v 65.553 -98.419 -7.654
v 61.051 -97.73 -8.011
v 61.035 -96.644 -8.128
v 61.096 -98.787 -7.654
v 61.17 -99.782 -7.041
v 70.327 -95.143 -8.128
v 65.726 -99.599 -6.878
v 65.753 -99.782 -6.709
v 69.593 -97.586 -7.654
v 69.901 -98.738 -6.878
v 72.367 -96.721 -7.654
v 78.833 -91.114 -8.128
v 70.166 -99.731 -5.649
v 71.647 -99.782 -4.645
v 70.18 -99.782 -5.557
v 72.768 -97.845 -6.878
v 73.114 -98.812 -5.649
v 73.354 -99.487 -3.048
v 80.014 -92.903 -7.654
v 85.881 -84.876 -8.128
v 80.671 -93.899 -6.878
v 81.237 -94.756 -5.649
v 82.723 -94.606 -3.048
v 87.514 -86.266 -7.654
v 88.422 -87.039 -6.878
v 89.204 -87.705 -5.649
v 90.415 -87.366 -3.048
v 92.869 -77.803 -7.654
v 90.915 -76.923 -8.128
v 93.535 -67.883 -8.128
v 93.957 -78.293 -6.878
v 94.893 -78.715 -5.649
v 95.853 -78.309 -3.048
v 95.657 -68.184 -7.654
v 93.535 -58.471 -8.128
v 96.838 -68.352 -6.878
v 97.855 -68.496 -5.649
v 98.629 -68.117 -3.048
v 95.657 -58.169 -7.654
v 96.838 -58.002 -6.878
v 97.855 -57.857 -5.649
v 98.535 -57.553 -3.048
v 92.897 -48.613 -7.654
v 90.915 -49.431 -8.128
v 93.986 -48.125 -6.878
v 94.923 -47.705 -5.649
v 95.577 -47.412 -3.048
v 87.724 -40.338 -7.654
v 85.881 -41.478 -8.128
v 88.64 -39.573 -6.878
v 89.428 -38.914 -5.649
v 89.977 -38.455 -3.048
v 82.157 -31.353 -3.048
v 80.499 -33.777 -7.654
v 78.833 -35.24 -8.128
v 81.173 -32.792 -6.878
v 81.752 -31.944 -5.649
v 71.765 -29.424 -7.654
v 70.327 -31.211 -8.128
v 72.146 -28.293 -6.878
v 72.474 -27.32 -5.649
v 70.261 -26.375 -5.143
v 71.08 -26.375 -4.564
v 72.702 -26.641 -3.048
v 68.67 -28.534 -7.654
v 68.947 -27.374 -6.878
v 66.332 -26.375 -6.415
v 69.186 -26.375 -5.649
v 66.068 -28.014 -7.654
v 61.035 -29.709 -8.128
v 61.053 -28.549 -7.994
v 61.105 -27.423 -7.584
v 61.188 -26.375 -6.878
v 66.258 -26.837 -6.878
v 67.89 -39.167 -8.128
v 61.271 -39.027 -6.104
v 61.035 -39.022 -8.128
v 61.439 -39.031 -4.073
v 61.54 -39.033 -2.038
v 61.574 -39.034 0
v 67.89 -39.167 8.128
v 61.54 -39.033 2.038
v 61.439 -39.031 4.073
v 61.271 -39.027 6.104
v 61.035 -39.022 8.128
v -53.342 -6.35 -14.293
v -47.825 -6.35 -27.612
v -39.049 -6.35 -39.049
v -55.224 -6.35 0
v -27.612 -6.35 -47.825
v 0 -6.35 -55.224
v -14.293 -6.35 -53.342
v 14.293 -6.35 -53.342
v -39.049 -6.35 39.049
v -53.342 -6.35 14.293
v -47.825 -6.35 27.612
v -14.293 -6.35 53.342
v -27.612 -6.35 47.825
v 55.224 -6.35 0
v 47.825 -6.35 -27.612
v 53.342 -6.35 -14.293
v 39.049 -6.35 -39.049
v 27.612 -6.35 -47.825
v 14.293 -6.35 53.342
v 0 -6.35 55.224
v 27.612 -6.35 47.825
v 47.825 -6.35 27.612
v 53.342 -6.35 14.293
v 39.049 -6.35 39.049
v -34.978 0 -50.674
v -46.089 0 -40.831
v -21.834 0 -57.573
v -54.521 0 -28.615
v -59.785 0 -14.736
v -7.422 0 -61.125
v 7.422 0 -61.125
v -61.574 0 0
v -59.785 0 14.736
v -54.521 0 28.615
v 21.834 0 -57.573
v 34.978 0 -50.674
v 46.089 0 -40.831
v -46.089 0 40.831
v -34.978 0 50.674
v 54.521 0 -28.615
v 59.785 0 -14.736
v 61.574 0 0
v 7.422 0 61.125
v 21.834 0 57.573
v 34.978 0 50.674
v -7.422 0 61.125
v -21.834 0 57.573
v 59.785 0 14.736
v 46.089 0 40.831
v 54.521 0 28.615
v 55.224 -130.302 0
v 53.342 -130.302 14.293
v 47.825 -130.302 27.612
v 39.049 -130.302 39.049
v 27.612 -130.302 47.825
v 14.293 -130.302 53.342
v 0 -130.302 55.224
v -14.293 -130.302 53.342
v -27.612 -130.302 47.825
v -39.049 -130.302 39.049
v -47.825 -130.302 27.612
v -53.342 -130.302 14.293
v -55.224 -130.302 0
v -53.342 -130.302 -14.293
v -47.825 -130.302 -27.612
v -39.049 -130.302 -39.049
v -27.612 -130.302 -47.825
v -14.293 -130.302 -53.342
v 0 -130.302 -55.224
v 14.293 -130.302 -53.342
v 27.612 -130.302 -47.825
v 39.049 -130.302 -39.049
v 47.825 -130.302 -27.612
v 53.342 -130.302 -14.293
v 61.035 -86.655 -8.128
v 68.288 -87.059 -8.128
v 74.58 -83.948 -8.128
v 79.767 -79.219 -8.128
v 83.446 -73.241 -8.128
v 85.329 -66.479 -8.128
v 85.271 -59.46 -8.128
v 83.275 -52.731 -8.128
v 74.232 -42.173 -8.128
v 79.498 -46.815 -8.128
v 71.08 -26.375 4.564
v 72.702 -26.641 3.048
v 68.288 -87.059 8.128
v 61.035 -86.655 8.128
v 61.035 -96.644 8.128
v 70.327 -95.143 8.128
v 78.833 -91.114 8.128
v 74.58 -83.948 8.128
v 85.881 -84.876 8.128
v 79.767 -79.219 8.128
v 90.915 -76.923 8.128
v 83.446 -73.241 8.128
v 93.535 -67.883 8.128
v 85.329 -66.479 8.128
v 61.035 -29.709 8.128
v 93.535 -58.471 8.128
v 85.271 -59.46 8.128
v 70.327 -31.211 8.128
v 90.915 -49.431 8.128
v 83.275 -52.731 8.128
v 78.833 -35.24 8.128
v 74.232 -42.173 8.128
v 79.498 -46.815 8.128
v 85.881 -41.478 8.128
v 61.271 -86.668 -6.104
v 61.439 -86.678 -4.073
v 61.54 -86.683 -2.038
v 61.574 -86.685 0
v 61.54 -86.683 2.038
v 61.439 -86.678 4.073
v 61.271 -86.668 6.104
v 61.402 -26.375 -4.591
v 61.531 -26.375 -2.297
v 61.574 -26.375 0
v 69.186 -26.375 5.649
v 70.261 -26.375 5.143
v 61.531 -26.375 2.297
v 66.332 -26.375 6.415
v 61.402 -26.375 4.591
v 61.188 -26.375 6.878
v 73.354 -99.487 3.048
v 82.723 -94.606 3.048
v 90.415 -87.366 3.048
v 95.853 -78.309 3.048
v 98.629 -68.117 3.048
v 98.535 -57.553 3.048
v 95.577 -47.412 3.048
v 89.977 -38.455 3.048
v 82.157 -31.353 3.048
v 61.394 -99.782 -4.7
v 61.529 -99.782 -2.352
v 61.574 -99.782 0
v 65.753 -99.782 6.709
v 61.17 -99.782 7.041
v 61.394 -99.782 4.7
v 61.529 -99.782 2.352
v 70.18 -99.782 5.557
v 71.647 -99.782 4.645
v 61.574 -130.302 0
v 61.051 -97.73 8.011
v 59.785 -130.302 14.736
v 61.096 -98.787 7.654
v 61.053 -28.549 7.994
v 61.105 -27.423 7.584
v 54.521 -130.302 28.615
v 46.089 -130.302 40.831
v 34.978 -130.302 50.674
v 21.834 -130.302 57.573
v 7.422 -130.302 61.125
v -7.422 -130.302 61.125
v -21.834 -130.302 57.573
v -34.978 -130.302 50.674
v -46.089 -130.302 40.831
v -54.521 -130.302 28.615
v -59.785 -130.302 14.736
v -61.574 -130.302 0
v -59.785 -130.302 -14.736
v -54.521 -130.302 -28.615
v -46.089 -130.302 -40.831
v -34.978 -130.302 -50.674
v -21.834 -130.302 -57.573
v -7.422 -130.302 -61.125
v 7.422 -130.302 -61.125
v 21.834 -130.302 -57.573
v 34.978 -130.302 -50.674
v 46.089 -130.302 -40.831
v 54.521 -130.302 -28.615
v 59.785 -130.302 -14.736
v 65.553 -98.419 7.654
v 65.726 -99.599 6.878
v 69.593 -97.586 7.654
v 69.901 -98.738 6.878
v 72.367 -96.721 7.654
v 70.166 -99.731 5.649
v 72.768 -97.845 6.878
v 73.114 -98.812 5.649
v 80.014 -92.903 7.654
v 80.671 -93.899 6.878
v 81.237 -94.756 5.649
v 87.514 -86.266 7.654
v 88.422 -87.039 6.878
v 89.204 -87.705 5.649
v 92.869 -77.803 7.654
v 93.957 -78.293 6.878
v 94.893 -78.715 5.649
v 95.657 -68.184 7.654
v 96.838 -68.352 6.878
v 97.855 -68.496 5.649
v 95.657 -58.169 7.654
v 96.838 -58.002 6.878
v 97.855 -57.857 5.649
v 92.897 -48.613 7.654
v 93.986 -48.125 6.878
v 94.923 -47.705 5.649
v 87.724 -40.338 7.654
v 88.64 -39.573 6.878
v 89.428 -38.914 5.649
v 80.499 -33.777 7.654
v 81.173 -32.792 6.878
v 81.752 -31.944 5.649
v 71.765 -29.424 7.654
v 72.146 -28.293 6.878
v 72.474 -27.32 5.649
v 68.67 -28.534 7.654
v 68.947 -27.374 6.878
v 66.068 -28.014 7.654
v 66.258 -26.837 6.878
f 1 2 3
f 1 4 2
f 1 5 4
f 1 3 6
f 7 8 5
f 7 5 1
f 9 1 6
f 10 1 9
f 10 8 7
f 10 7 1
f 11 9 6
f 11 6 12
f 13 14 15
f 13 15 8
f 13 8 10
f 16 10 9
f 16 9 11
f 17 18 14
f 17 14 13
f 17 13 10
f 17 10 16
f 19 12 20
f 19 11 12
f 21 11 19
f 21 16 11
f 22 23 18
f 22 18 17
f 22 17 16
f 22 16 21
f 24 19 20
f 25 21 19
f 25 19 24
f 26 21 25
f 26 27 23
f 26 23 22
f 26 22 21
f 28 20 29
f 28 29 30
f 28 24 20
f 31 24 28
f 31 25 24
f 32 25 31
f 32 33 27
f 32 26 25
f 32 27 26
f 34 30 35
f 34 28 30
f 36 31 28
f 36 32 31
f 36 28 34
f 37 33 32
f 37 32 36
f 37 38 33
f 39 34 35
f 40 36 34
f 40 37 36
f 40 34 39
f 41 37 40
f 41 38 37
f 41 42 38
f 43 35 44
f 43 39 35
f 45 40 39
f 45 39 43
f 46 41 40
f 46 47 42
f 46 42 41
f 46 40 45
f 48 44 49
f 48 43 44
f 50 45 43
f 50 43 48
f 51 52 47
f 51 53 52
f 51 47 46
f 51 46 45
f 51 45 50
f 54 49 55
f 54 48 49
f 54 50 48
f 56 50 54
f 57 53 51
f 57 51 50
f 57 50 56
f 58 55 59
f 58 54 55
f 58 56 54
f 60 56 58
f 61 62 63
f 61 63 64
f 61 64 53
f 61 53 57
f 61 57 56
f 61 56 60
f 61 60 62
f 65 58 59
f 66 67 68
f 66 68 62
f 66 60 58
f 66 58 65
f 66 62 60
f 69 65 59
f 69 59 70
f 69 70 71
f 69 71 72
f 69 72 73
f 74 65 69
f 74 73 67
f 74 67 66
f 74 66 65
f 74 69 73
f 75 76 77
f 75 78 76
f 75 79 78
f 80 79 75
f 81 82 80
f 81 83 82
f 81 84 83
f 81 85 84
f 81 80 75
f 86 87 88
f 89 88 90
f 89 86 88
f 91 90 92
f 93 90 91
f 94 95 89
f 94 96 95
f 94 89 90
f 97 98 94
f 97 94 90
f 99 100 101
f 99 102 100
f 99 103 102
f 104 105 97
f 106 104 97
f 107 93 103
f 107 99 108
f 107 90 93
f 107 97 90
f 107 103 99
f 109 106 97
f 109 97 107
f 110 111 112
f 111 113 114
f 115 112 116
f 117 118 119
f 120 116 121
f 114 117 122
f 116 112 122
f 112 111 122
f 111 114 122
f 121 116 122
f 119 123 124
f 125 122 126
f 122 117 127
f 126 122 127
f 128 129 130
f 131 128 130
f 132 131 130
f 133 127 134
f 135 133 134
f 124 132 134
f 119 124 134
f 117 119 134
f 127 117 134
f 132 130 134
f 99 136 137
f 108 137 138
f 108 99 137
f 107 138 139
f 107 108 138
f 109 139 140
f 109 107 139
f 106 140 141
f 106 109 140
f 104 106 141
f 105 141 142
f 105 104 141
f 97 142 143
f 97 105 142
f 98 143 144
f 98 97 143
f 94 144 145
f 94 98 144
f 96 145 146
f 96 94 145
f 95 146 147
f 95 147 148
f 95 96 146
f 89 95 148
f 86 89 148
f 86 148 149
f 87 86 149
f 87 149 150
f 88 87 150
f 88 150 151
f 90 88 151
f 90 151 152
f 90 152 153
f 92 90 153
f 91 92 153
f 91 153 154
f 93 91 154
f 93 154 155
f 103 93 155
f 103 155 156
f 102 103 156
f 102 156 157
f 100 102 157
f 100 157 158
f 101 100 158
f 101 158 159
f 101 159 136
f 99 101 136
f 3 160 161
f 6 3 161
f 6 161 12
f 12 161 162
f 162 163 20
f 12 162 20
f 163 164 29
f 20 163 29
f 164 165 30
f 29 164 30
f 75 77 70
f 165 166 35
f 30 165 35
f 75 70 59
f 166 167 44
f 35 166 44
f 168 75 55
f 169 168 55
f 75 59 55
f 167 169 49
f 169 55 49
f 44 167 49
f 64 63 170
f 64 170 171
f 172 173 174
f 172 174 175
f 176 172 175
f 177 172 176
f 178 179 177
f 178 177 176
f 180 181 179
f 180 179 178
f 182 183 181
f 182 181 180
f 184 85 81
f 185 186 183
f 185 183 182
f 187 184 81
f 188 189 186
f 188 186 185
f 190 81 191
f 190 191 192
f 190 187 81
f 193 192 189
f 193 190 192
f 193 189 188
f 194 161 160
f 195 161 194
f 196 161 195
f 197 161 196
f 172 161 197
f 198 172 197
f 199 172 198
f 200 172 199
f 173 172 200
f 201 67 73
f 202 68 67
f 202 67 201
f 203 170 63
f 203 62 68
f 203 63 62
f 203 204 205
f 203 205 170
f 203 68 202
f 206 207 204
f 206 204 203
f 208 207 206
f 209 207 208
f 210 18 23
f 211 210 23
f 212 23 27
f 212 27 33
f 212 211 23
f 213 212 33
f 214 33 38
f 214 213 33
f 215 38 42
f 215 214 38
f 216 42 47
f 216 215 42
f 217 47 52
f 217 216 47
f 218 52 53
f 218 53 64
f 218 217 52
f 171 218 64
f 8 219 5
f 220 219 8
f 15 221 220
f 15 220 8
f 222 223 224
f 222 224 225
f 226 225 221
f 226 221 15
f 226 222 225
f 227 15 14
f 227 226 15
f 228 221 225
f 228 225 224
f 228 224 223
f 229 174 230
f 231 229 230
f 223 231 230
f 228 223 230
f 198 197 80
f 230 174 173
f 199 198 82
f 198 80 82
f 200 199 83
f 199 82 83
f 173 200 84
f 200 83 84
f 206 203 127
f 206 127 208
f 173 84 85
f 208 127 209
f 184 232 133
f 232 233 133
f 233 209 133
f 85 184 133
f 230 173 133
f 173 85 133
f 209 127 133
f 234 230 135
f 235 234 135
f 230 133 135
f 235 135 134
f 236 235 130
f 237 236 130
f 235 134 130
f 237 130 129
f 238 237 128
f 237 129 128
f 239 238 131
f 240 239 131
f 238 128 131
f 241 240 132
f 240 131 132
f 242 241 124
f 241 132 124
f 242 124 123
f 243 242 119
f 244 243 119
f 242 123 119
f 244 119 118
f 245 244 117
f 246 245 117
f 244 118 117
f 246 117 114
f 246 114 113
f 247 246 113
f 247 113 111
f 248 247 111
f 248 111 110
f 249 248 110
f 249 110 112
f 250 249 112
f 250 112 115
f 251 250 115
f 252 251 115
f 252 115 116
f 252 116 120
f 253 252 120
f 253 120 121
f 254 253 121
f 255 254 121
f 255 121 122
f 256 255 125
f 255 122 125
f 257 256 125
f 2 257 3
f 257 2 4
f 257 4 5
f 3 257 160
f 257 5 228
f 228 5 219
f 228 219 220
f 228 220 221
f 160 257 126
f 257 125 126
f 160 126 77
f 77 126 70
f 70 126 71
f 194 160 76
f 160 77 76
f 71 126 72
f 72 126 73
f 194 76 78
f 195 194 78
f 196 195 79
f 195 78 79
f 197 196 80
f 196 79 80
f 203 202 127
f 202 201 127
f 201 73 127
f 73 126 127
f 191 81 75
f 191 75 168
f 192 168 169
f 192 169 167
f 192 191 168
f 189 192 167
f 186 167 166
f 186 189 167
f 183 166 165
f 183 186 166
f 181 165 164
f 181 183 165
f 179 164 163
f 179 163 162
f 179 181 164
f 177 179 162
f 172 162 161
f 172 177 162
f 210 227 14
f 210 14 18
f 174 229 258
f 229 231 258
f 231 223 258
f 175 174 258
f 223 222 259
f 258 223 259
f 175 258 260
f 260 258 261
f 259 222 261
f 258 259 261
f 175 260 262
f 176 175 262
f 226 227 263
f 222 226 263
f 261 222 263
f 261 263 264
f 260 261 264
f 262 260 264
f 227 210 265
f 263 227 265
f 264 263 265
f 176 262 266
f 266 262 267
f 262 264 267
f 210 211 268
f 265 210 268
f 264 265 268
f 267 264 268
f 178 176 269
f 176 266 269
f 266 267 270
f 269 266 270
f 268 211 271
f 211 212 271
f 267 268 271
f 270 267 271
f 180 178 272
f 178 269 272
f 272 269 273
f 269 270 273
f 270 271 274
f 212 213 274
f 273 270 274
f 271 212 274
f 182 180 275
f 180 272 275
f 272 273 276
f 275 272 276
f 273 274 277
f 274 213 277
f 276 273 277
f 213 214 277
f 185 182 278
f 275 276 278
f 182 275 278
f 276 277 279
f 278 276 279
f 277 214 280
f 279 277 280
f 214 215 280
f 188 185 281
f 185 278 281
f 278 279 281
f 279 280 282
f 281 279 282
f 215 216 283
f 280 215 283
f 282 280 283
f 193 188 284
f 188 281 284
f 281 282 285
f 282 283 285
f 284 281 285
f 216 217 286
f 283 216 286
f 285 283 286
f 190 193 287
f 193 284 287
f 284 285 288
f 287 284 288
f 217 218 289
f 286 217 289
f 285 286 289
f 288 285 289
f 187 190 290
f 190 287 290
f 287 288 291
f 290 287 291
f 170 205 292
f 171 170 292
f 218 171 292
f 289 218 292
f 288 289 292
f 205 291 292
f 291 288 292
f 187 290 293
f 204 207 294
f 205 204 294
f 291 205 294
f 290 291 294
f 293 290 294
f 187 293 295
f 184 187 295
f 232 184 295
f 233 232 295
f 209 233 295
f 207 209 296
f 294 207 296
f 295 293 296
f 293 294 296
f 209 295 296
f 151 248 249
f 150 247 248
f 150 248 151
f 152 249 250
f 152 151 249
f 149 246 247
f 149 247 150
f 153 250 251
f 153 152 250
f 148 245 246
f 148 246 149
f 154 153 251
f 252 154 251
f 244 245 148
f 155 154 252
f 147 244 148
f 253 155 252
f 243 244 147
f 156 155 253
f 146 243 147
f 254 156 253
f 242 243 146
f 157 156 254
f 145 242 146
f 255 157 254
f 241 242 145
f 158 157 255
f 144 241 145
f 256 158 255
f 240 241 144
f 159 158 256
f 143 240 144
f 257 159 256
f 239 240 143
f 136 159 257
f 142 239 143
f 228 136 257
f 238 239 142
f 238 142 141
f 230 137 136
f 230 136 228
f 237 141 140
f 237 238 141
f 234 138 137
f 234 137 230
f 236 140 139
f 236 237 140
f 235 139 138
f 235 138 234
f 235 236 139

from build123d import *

# Parameters (mm, degrees)
F0_R         = 61.5738591245
F1_DEPTH     = 130.302
F2_T         = -6.35
F4_DEPTH     = 8.128
F5_T1_DEPTH  = 20.8040228352
F5_T3_DEPTH  = 20.562657233
F5_T8_ANGLE  = 182.1562701249
F5_S9_R      = 61.5738591245
F5_T10_DEPTH = 49
F5_T14_ANGLE = 182.1562701249
F5_S15_R     = 61.5738591245
F5_T16_DEPTH = 49


# Not quite as in the source:
# - a fillet or chamfer that OpenCascade refuses, or shapes differently, is made with other operations: its cross-section is extruded or revolved along the edge and cut away or added


with BuildPart() as f1:
    # F0 (on Front) → F1 (new body)
    with BuildSketch(Plane.XZ):
        Circle(F0_R)
    extrude(amount=F1_DEPTH)

    # F2
    f2_openings = [f1.faces().sort_by_distance(p)[0] for p in [
        (0, -130.302, 0),
    ]]
    offset(amount=F2_T, openings=f2_openings)

    # F3 (on Top) → F4 (join, symmetric)
    with BuildSketch(Plane.XY):
        with BuildLine():
            Line((59.0887926519, -99.7823445332), (72.4941612439, -99.7823445332))
            ThreePointArc((72.4941612439, -99.7823445332), (98.9458486723, -62.8559772667), (71.8830453985, -26.3751186382))
            Line((71.8830453985, -26.3751186382), (59.0614564717, -26.3751186382))
            Line((59.0614564717, -26.3751186382), (59.0614564717, -38.9808338419))
            Line((59.0614564717, -38.9808338419), (67.8895905633, -39.1665116223))
            ThreePointArc((67.8895905633, -39.1665116223), (85.5460362932, -62.9675308307), (68.2882977353, -87.0592109513))
            Line((68.2882977353, -87.0592109513), (59.0887926519, -86.546982936))
            Line((59.0887926519, -86.546982936), (59.0887926519, -99.7823445332))
        make_face()
    extrude(amount=F4_DEPTH, both=True)

    # F5: fillet of radius 5.08 on 4 edges, made by hand

    # F5_s2 → F5_t1 (cut)
    with BuildSketch(Plane.XY.offset(-10.4020114176)):
        with BuildLine():
            ThreePointArc((71.6465994249, -99.7823445332), (72.5131887158, -99.7078837649), (73.3543737137, -99.4866842973))
            ThreePointArc((73.3543737137, -99.4866842973), (72.925139457, -99.6370514033), (72.4941612439, -99.7823445332))
            Line((72.4941612439, -99.7823445332), (71.6465994249, -99.7823445332))
        make_face()
    extrude(amount=F5_T1_DEPTH, mode=Mode.SUBTRACT)

    # F5_s4 → F5_t3 (cut)
    with BuildSketch(Plane.XY.offset(-10.2813286165)):
        with BuildLine():
            ThreePointArc((71.0804640636, -26.3751186382), (71.9022151056, -26.4420232646), (72.7023208932, -26.6409748489))
            ThreePointArc((72.7023208932, -26.6409748489), (72.2934256102, -26.5057587291), (71.8830453985, -26.3751186382))
            Line((71.8830453985, -26.3751186382), (71.0804640636, -26.3751186382))
        make_face()
    extrude(amount=F5_T3_DEPTH, mode=Mode.SUBTRACT)


with BuildPart() as f5_tool6:
    # F5_s7 → F5_t8 (revolve)
    with BuildSketch(Plane(origin=(61.0497406785, -0.6405689566, 0), x_dir=(0, 0, 1), z_dir=(-0.9999449575, 0.010491997, 0))):
        with BuildLine():
            ThreePointArc((-8.128, -96.0134100137), (-6.6401024484, -99.6055124621), (-3.048, -101.0934100137))
            Line((-3.048, -101.0934100137), (-8.128, -101.0934100137))
            Line((-8.128, -101.0934100137), (-8.128, -96.0134100137))
        make_face()
    revolve(axis=Axis((60.393573296, -63.1769253215, -8.128), (0, 0, 1)), revolution_arc=F5_T8_ANGLE)

    # F5_s9 → F5_t10 (cut, symmetric)
    with BuildSketch(Plane.XZ.offset(63.2)):
        Circle(F5_S9_R)
    extrude(amount=F5_T10_DEPTH, both=True, mode=Mode.SUBTRACT)


with BuildPart() as f1_1:
    add(f1.part)

    # F5_t5: cut F5_tool6
    add(f5_tool6.part, mode=Mode.SUBTRACT)


with BuildPart() as f5_tool12:
    # F5_s13 → F5_t14 (revolve)
    with BuildSketch(Plane(origin=(61.0497406785, -0.6405689566, 0), x_dir=(0, 0, 1), z_dir=(-0.9999449575, 0.010491997, 0))):
        with BuildLine():
            ThreePointArc((8.128, -96.0134100137), (6.6401024484, -99.6055124621), (3.048, -101.0934100137))
            Line((3.048, -101.0934100137), (8.128, -101.0934100137))
            Line((8.128, -101.0934100137), (8.128, -96.0134100137))
        make_face()
    revolve(axis=Axis((60.393573296, -63.1769253215, 8.128), (0, 0, 1)), revolution_arc=F5_T14_ANGLE)

    # F5_s15 → F5_t16 (cut, symmetric)
    with BuildSketch(Plane.XZ.offset(63.2)):
        Circle(F5_S15_R)
    extrude(amount=F5_T16_DEPTH, both=True, mode=Mode.SUBTRACT)


with BuildPart() as f1_2:
    add(f1_1.part)

    # F5_t11: cut F5_tool12
    add(f5_tool12.part, mode=Mode.SUBTRACT)


solid = f1_2.part
